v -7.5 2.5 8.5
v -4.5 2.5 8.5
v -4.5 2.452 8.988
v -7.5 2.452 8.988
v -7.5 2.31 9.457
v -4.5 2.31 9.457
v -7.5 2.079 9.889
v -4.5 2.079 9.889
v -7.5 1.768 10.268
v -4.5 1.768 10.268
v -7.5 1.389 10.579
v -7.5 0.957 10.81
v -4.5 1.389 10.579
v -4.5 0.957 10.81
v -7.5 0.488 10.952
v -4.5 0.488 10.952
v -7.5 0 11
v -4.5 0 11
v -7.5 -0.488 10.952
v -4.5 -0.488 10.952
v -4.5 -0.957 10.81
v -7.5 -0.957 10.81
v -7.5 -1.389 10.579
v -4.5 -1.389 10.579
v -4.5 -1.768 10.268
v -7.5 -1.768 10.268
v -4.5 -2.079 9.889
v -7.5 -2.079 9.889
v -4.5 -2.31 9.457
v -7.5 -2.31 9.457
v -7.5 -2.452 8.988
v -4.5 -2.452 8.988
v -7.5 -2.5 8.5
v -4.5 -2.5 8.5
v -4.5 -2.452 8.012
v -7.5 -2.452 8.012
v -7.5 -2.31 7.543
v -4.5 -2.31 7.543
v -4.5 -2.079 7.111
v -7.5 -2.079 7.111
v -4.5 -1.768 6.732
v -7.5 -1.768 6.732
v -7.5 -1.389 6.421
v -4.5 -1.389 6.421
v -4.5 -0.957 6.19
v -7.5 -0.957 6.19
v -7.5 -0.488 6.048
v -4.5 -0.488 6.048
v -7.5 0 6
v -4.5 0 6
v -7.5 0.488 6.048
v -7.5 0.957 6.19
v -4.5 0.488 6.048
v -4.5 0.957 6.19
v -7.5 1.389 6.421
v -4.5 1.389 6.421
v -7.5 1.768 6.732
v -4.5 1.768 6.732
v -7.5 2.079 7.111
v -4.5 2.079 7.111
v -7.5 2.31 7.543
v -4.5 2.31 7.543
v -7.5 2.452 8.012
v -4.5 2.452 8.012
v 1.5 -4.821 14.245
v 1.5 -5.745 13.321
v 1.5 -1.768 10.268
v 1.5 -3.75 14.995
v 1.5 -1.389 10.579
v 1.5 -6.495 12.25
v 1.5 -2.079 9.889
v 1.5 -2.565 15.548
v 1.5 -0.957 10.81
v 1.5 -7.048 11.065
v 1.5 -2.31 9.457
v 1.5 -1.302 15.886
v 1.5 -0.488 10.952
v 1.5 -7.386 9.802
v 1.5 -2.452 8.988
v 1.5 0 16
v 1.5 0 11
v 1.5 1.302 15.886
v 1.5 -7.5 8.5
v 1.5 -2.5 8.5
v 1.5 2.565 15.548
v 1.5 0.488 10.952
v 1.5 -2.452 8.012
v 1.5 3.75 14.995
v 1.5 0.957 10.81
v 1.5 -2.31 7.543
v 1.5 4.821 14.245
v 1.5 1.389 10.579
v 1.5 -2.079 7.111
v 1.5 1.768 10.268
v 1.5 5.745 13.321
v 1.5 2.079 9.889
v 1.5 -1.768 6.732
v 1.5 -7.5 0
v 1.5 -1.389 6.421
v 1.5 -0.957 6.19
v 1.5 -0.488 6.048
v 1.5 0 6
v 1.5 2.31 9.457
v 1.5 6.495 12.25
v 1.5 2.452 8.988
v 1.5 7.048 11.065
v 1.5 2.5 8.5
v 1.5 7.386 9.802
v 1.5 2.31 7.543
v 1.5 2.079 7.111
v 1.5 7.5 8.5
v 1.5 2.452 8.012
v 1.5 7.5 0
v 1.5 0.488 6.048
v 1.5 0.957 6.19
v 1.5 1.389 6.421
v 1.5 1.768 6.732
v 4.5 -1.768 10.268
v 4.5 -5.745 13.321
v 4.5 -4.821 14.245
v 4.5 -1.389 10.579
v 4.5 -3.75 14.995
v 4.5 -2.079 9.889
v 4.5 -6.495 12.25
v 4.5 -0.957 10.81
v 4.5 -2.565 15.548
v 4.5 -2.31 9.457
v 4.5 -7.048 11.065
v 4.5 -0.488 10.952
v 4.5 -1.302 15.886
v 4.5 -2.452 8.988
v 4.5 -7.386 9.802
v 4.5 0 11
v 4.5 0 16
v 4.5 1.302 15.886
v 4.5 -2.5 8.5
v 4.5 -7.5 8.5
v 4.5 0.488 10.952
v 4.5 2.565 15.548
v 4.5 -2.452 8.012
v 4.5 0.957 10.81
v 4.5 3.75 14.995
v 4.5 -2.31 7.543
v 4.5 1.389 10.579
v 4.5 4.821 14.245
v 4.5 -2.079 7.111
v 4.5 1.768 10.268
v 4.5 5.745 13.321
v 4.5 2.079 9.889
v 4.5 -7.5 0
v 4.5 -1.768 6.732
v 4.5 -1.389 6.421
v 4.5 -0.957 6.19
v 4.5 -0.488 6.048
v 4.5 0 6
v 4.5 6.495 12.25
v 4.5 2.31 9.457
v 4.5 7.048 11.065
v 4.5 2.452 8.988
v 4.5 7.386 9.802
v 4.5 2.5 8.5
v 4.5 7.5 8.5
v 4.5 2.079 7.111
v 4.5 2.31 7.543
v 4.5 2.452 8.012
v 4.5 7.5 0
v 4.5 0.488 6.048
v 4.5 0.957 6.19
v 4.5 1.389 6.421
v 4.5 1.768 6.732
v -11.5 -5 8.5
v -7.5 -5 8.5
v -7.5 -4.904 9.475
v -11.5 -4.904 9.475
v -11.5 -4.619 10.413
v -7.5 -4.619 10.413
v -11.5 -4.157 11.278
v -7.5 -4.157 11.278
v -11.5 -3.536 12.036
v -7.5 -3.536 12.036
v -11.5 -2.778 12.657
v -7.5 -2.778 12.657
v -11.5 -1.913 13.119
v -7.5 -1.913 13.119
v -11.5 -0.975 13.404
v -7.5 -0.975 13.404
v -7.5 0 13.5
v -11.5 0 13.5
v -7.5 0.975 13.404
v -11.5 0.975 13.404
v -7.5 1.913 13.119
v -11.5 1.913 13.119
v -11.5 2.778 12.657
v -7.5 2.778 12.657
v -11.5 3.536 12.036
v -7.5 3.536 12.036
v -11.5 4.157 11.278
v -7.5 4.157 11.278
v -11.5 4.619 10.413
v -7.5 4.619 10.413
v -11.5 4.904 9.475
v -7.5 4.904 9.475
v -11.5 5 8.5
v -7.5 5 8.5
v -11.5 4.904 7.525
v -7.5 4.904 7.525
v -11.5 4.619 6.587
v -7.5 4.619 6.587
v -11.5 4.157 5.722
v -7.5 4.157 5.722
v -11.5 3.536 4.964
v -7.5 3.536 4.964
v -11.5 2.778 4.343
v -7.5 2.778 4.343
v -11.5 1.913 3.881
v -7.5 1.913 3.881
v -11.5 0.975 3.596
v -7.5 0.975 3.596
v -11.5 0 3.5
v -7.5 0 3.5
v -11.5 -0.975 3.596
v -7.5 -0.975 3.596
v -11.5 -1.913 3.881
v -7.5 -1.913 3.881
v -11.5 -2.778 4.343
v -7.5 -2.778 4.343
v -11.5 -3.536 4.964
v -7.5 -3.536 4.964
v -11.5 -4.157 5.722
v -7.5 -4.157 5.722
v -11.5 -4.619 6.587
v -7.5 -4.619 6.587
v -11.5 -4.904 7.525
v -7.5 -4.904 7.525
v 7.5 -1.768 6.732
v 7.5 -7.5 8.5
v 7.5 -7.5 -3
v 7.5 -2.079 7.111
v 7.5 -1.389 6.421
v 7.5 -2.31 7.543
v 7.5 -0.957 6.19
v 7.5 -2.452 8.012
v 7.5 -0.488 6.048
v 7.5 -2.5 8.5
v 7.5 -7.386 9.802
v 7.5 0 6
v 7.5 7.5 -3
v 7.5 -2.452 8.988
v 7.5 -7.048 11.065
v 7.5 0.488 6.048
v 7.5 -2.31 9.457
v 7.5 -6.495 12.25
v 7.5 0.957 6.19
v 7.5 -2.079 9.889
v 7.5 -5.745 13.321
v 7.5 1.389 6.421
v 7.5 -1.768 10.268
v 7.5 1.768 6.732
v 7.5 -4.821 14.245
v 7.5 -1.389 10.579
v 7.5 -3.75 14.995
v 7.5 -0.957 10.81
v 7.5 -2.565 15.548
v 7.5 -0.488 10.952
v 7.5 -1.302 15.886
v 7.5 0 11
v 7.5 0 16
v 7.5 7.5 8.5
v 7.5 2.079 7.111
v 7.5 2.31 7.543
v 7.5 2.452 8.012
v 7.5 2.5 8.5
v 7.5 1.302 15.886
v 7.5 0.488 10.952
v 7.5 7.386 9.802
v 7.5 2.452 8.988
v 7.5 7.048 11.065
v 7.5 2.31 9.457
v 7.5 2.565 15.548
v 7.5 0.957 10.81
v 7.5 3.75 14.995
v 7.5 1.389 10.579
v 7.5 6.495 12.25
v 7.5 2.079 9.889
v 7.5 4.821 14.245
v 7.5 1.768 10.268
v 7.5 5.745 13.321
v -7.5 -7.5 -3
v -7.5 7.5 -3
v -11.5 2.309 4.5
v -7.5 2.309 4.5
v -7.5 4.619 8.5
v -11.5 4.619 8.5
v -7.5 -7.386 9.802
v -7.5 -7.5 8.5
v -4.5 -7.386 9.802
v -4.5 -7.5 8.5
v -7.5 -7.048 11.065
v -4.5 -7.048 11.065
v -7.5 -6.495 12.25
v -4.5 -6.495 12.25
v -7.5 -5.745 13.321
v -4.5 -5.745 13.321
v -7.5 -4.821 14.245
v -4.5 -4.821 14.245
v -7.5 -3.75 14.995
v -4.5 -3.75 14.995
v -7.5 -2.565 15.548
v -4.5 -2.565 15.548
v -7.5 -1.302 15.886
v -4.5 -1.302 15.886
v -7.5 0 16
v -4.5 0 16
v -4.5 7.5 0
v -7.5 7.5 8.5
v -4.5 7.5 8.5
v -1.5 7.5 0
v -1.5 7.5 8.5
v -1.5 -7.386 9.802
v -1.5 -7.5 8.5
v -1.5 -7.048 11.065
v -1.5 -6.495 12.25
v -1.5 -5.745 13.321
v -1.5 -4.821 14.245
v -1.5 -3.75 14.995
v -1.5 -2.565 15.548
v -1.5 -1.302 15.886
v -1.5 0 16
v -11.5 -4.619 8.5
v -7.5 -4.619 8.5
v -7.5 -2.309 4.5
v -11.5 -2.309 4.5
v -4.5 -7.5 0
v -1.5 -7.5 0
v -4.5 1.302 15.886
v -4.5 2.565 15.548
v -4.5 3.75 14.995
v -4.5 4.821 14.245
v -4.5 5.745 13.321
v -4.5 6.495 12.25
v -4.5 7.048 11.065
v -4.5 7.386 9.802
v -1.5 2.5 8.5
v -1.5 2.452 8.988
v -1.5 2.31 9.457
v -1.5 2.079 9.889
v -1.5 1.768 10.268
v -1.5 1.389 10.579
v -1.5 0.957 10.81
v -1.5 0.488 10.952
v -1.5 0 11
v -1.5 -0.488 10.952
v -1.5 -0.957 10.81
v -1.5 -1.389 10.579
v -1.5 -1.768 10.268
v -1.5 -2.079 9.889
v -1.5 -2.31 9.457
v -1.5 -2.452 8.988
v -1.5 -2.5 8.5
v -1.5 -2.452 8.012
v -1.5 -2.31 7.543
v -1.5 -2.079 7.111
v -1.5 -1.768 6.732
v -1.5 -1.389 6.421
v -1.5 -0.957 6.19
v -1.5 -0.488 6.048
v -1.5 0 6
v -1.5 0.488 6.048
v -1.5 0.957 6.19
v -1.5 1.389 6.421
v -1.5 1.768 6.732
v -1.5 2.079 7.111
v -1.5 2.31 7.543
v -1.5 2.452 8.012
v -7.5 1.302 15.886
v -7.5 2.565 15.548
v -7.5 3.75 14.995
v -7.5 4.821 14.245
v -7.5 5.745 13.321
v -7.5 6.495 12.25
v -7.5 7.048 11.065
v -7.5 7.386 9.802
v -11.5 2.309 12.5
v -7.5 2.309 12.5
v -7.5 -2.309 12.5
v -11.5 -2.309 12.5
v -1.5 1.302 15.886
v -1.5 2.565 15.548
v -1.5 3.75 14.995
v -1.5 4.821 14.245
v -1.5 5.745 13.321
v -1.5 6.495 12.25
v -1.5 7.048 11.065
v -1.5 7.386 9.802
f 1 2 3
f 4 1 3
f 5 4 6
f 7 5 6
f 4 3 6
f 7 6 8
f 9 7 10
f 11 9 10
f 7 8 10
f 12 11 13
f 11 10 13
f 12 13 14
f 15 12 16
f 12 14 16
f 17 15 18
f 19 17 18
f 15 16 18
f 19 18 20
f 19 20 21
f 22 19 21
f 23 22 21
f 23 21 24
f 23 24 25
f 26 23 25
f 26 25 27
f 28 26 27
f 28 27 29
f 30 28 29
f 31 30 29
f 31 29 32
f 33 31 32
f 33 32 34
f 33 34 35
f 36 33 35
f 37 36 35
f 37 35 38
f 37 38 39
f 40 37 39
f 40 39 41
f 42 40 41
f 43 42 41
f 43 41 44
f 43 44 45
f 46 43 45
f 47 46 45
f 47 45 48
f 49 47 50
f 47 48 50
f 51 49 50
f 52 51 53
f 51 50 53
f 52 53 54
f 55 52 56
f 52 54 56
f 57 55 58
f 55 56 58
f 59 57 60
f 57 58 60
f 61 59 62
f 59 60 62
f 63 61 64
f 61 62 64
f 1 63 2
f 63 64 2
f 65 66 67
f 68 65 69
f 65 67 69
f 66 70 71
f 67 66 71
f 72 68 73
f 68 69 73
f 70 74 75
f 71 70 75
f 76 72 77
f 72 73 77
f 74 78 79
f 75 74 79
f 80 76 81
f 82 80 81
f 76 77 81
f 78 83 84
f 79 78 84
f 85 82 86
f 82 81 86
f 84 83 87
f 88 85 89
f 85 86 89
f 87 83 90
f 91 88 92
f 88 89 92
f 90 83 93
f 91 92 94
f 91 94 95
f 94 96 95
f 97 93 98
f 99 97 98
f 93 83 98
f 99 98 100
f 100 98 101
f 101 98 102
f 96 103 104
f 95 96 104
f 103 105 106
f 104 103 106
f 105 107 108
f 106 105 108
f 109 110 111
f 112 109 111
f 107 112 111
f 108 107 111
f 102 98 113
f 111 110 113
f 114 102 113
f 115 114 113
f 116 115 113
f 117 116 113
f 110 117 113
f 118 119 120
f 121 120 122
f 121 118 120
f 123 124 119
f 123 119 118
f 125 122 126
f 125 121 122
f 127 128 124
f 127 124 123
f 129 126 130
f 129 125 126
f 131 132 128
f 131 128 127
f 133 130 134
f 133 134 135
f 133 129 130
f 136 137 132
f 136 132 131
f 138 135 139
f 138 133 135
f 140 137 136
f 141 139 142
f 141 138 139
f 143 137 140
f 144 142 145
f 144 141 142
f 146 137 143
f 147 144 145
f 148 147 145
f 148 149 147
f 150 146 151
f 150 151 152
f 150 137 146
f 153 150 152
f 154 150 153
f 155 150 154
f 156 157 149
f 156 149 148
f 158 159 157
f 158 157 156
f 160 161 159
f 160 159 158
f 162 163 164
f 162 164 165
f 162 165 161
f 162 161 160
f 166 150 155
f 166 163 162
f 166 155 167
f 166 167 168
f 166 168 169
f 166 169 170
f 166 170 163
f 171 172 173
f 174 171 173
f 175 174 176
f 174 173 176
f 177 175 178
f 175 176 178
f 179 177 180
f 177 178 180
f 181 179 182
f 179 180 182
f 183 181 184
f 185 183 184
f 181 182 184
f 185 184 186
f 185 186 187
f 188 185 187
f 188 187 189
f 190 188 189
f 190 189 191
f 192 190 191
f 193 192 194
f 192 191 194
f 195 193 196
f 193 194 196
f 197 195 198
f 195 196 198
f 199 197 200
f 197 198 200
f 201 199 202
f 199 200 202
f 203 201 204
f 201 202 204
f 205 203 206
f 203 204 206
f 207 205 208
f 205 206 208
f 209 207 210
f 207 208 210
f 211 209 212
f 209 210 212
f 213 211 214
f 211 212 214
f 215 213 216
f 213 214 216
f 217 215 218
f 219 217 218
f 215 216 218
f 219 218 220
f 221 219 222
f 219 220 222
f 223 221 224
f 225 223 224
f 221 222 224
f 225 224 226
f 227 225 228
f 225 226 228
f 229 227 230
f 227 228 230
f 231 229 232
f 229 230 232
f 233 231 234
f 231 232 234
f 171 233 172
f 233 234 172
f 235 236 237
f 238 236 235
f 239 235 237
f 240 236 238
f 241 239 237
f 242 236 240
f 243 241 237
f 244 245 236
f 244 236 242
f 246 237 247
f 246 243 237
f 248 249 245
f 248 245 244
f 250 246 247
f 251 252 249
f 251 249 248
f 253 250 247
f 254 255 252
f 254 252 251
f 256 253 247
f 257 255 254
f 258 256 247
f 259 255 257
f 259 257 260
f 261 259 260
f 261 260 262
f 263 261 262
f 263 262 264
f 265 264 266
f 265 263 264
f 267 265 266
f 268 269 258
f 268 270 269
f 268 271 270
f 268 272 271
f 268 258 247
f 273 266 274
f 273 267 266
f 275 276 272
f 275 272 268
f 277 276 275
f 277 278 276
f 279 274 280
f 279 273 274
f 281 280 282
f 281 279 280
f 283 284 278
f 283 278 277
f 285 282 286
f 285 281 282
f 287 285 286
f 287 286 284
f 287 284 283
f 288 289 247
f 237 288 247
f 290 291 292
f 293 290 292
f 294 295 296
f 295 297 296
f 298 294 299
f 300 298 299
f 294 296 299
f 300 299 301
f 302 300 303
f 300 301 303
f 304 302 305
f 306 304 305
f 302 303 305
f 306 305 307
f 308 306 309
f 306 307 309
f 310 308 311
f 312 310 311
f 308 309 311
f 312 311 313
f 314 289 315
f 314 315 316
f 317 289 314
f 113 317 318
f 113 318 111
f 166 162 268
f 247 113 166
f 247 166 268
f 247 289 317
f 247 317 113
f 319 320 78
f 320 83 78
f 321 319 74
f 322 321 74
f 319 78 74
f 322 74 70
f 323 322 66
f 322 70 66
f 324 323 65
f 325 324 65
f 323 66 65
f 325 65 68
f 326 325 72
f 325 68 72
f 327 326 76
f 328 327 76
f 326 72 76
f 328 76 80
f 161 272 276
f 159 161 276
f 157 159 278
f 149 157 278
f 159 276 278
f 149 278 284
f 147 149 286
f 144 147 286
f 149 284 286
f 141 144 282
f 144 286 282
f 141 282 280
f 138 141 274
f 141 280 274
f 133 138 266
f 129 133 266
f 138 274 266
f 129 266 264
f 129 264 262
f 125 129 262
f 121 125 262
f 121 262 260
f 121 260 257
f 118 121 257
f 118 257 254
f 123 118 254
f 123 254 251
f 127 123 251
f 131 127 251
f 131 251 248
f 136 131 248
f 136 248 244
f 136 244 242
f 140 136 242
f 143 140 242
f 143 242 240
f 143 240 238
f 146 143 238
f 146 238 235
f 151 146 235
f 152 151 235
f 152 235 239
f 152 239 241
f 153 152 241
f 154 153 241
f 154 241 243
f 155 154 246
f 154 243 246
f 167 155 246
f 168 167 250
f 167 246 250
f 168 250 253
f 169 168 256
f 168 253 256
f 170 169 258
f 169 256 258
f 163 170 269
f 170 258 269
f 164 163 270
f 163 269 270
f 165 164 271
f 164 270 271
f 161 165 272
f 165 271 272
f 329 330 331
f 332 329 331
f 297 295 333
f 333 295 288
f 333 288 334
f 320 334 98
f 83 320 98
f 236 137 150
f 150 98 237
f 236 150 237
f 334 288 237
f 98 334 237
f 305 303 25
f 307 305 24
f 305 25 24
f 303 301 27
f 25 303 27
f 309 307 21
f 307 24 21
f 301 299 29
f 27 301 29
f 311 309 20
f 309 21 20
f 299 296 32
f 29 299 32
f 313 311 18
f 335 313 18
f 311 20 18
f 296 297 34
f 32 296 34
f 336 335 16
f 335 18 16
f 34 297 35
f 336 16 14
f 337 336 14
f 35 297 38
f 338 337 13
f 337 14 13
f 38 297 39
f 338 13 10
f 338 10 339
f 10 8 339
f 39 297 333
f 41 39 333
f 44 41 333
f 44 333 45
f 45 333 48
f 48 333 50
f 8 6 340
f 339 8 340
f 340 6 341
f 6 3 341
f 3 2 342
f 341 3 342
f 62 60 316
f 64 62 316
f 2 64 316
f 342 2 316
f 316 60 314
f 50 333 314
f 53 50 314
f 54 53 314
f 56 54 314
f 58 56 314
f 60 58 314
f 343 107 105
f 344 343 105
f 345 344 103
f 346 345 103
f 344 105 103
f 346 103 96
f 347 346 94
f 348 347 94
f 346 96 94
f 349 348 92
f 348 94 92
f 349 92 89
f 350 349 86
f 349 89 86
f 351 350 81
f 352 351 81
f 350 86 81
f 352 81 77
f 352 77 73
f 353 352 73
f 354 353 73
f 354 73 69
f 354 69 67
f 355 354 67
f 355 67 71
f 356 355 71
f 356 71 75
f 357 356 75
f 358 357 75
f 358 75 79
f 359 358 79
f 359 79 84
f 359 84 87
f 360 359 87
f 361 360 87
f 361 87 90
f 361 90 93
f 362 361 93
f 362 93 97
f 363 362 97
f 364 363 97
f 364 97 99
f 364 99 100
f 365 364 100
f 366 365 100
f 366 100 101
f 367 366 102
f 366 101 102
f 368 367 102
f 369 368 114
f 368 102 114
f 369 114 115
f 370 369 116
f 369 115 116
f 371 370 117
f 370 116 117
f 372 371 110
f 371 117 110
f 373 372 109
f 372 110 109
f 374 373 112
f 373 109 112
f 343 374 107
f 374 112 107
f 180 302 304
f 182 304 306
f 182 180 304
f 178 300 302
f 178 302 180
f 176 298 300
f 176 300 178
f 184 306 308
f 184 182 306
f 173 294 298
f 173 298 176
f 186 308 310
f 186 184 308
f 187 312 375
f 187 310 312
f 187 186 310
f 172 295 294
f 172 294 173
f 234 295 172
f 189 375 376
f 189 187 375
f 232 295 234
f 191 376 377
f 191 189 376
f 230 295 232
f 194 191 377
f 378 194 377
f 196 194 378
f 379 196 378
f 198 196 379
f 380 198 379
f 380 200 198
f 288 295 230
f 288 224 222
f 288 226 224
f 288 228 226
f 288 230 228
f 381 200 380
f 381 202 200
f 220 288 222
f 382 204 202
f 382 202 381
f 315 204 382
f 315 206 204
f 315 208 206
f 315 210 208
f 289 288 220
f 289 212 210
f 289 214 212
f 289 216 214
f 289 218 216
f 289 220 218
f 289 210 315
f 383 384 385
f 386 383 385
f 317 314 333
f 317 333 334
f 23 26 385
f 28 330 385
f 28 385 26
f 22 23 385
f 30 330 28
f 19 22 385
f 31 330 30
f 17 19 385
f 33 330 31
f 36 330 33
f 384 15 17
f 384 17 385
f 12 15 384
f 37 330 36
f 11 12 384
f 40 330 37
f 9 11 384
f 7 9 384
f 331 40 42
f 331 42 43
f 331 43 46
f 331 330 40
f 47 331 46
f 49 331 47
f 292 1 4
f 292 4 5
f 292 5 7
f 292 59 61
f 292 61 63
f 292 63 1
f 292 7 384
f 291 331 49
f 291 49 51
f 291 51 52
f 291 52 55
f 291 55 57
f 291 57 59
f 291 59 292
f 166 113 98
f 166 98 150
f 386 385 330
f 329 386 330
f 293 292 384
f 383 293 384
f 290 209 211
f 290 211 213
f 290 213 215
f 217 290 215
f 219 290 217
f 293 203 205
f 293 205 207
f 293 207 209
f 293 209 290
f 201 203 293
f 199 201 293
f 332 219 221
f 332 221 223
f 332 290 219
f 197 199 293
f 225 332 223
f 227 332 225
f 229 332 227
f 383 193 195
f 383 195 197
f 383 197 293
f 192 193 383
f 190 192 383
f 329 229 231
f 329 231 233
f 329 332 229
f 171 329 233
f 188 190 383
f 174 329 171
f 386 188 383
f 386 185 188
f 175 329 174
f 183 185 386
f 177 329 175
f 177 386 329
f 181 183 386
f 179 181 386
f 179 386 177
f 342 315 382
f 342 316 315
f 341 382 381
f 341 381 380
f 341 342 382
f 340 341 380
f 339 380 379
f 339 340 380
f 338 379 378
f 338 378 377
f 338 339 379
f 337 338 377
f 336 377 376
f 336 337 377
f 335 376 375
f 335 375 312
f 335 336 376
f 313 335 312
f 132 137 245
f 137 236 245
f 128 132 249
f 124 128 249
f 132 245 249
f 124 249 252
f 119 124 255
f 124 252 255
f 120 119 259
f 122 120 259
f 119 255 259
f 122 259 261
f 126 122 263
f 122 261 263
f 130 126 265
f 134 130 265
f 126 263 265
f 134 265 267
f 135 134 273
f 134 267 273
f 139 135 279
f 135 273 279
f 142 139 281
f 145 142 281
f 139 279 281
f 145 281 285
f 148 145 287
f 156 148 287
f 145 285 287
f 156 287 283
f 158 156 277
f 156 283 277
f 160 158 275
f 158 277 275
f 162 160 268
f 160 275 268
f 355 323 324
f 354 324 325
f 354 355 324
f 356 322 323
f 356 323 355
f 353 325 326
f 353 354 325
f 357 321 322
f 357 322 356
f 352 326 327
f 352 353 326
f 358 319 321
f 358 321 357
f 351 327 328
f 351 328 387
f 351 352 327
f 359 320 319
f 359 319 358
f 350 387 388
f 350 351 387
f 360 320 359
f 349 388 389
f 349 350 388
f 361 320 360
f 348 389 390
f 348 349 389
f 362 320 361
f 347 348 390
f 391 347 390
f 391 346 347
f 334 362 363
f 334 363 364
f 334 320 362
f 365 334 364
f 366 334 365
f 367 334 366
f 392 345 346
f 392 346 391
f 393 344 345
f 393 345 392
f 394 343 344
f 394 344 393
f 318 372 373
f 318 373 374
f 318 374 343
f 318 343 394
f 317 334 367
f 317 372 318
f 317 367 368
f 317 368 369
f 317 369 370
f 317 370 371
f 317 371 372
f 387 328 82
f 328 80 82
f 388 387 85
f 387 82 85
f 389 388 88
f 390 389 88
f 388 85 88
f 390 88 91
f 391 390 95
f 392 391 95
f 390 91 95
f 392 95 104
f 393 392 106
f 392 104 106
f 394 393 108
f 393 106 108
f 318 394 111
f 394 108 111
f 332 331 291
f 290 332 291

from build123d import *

# Parameters (mm, degrees)
F2_W     = 15
F2_H     = 15
F3_DEPTH = 3
F4_W     = 3
F4_H     = 15
F5_DEPTH = 16
F6_R     = 7.49999
F8_D     = 5
F7_R     = 5
F9_DEPTH = 4


# Not quite as in the source:
# - a fillet or chamfer is up to 0.001 mm smaller than in the source, because OpenCascade refuses the exact size


with BuildPart() as f3:
    # F2 (on Top) → F3 (new body)
    with BuildSketch(Plane.XY):
        Rectangle(F2_W, F2_H)
    extrude(amount=-F3_DEPTH)

    # F4 (on face) → F5 (join)
    with BuildSketch(Plane.XY):
        with Locations((-6, 0)):
            Rectangle(F4_W, F4_H)
        Rectangle(F4_W, F4_H)
        with Locations((6, 0)):
            Rectangle(F4_W, F4_H)
    extrude(amount=F5_DEPTH)

    # F6 (radius 7.5 in the source; OpenCascade refuses exactly that, so slightly less here)
    f6_edges = [f3.edges().sort_by_distance(p)[0] for p in [
        (-6, 7.5, 16),
        (0, 7.5, 16),
        (6, 7.5, 16),
        (-6, -7.5, 16),
        (0, -7.5, 16),
        (6, -7.5, 16),
    ]]
    fillet(f6_edges, radius=F6_R)

    # F8 (through all)
    with Locations(Plane(origin=(-7.5, 0, 0), x_dir=(0, -1, 0), z_dir=(-1, 0, 0))):
        with Locations((0, 8.5)):
            Hole(F8_D / 2)

    # F7 (on face) → F9 (join)
    with BuildSketch(Plane(origin=(-7.5, 0, 0), x_dir=(0, -1, 0), z_dir=(-1, 0, 0))):
        with Locations((0, 8.5)):
            Circle(F7_R)
        Polygon((-4.6188021535, 8.5), (-2.3094010768, 12.5), (2.3094010768, 12.5), (4.6188021535, 8.5), (2.3094010768, 4.5), (-2.3094010768, 4.5), align=None, mode=Mode.SUBTRACT)
    extrude(amount=F9_DEPTH)


solid = f3.part
